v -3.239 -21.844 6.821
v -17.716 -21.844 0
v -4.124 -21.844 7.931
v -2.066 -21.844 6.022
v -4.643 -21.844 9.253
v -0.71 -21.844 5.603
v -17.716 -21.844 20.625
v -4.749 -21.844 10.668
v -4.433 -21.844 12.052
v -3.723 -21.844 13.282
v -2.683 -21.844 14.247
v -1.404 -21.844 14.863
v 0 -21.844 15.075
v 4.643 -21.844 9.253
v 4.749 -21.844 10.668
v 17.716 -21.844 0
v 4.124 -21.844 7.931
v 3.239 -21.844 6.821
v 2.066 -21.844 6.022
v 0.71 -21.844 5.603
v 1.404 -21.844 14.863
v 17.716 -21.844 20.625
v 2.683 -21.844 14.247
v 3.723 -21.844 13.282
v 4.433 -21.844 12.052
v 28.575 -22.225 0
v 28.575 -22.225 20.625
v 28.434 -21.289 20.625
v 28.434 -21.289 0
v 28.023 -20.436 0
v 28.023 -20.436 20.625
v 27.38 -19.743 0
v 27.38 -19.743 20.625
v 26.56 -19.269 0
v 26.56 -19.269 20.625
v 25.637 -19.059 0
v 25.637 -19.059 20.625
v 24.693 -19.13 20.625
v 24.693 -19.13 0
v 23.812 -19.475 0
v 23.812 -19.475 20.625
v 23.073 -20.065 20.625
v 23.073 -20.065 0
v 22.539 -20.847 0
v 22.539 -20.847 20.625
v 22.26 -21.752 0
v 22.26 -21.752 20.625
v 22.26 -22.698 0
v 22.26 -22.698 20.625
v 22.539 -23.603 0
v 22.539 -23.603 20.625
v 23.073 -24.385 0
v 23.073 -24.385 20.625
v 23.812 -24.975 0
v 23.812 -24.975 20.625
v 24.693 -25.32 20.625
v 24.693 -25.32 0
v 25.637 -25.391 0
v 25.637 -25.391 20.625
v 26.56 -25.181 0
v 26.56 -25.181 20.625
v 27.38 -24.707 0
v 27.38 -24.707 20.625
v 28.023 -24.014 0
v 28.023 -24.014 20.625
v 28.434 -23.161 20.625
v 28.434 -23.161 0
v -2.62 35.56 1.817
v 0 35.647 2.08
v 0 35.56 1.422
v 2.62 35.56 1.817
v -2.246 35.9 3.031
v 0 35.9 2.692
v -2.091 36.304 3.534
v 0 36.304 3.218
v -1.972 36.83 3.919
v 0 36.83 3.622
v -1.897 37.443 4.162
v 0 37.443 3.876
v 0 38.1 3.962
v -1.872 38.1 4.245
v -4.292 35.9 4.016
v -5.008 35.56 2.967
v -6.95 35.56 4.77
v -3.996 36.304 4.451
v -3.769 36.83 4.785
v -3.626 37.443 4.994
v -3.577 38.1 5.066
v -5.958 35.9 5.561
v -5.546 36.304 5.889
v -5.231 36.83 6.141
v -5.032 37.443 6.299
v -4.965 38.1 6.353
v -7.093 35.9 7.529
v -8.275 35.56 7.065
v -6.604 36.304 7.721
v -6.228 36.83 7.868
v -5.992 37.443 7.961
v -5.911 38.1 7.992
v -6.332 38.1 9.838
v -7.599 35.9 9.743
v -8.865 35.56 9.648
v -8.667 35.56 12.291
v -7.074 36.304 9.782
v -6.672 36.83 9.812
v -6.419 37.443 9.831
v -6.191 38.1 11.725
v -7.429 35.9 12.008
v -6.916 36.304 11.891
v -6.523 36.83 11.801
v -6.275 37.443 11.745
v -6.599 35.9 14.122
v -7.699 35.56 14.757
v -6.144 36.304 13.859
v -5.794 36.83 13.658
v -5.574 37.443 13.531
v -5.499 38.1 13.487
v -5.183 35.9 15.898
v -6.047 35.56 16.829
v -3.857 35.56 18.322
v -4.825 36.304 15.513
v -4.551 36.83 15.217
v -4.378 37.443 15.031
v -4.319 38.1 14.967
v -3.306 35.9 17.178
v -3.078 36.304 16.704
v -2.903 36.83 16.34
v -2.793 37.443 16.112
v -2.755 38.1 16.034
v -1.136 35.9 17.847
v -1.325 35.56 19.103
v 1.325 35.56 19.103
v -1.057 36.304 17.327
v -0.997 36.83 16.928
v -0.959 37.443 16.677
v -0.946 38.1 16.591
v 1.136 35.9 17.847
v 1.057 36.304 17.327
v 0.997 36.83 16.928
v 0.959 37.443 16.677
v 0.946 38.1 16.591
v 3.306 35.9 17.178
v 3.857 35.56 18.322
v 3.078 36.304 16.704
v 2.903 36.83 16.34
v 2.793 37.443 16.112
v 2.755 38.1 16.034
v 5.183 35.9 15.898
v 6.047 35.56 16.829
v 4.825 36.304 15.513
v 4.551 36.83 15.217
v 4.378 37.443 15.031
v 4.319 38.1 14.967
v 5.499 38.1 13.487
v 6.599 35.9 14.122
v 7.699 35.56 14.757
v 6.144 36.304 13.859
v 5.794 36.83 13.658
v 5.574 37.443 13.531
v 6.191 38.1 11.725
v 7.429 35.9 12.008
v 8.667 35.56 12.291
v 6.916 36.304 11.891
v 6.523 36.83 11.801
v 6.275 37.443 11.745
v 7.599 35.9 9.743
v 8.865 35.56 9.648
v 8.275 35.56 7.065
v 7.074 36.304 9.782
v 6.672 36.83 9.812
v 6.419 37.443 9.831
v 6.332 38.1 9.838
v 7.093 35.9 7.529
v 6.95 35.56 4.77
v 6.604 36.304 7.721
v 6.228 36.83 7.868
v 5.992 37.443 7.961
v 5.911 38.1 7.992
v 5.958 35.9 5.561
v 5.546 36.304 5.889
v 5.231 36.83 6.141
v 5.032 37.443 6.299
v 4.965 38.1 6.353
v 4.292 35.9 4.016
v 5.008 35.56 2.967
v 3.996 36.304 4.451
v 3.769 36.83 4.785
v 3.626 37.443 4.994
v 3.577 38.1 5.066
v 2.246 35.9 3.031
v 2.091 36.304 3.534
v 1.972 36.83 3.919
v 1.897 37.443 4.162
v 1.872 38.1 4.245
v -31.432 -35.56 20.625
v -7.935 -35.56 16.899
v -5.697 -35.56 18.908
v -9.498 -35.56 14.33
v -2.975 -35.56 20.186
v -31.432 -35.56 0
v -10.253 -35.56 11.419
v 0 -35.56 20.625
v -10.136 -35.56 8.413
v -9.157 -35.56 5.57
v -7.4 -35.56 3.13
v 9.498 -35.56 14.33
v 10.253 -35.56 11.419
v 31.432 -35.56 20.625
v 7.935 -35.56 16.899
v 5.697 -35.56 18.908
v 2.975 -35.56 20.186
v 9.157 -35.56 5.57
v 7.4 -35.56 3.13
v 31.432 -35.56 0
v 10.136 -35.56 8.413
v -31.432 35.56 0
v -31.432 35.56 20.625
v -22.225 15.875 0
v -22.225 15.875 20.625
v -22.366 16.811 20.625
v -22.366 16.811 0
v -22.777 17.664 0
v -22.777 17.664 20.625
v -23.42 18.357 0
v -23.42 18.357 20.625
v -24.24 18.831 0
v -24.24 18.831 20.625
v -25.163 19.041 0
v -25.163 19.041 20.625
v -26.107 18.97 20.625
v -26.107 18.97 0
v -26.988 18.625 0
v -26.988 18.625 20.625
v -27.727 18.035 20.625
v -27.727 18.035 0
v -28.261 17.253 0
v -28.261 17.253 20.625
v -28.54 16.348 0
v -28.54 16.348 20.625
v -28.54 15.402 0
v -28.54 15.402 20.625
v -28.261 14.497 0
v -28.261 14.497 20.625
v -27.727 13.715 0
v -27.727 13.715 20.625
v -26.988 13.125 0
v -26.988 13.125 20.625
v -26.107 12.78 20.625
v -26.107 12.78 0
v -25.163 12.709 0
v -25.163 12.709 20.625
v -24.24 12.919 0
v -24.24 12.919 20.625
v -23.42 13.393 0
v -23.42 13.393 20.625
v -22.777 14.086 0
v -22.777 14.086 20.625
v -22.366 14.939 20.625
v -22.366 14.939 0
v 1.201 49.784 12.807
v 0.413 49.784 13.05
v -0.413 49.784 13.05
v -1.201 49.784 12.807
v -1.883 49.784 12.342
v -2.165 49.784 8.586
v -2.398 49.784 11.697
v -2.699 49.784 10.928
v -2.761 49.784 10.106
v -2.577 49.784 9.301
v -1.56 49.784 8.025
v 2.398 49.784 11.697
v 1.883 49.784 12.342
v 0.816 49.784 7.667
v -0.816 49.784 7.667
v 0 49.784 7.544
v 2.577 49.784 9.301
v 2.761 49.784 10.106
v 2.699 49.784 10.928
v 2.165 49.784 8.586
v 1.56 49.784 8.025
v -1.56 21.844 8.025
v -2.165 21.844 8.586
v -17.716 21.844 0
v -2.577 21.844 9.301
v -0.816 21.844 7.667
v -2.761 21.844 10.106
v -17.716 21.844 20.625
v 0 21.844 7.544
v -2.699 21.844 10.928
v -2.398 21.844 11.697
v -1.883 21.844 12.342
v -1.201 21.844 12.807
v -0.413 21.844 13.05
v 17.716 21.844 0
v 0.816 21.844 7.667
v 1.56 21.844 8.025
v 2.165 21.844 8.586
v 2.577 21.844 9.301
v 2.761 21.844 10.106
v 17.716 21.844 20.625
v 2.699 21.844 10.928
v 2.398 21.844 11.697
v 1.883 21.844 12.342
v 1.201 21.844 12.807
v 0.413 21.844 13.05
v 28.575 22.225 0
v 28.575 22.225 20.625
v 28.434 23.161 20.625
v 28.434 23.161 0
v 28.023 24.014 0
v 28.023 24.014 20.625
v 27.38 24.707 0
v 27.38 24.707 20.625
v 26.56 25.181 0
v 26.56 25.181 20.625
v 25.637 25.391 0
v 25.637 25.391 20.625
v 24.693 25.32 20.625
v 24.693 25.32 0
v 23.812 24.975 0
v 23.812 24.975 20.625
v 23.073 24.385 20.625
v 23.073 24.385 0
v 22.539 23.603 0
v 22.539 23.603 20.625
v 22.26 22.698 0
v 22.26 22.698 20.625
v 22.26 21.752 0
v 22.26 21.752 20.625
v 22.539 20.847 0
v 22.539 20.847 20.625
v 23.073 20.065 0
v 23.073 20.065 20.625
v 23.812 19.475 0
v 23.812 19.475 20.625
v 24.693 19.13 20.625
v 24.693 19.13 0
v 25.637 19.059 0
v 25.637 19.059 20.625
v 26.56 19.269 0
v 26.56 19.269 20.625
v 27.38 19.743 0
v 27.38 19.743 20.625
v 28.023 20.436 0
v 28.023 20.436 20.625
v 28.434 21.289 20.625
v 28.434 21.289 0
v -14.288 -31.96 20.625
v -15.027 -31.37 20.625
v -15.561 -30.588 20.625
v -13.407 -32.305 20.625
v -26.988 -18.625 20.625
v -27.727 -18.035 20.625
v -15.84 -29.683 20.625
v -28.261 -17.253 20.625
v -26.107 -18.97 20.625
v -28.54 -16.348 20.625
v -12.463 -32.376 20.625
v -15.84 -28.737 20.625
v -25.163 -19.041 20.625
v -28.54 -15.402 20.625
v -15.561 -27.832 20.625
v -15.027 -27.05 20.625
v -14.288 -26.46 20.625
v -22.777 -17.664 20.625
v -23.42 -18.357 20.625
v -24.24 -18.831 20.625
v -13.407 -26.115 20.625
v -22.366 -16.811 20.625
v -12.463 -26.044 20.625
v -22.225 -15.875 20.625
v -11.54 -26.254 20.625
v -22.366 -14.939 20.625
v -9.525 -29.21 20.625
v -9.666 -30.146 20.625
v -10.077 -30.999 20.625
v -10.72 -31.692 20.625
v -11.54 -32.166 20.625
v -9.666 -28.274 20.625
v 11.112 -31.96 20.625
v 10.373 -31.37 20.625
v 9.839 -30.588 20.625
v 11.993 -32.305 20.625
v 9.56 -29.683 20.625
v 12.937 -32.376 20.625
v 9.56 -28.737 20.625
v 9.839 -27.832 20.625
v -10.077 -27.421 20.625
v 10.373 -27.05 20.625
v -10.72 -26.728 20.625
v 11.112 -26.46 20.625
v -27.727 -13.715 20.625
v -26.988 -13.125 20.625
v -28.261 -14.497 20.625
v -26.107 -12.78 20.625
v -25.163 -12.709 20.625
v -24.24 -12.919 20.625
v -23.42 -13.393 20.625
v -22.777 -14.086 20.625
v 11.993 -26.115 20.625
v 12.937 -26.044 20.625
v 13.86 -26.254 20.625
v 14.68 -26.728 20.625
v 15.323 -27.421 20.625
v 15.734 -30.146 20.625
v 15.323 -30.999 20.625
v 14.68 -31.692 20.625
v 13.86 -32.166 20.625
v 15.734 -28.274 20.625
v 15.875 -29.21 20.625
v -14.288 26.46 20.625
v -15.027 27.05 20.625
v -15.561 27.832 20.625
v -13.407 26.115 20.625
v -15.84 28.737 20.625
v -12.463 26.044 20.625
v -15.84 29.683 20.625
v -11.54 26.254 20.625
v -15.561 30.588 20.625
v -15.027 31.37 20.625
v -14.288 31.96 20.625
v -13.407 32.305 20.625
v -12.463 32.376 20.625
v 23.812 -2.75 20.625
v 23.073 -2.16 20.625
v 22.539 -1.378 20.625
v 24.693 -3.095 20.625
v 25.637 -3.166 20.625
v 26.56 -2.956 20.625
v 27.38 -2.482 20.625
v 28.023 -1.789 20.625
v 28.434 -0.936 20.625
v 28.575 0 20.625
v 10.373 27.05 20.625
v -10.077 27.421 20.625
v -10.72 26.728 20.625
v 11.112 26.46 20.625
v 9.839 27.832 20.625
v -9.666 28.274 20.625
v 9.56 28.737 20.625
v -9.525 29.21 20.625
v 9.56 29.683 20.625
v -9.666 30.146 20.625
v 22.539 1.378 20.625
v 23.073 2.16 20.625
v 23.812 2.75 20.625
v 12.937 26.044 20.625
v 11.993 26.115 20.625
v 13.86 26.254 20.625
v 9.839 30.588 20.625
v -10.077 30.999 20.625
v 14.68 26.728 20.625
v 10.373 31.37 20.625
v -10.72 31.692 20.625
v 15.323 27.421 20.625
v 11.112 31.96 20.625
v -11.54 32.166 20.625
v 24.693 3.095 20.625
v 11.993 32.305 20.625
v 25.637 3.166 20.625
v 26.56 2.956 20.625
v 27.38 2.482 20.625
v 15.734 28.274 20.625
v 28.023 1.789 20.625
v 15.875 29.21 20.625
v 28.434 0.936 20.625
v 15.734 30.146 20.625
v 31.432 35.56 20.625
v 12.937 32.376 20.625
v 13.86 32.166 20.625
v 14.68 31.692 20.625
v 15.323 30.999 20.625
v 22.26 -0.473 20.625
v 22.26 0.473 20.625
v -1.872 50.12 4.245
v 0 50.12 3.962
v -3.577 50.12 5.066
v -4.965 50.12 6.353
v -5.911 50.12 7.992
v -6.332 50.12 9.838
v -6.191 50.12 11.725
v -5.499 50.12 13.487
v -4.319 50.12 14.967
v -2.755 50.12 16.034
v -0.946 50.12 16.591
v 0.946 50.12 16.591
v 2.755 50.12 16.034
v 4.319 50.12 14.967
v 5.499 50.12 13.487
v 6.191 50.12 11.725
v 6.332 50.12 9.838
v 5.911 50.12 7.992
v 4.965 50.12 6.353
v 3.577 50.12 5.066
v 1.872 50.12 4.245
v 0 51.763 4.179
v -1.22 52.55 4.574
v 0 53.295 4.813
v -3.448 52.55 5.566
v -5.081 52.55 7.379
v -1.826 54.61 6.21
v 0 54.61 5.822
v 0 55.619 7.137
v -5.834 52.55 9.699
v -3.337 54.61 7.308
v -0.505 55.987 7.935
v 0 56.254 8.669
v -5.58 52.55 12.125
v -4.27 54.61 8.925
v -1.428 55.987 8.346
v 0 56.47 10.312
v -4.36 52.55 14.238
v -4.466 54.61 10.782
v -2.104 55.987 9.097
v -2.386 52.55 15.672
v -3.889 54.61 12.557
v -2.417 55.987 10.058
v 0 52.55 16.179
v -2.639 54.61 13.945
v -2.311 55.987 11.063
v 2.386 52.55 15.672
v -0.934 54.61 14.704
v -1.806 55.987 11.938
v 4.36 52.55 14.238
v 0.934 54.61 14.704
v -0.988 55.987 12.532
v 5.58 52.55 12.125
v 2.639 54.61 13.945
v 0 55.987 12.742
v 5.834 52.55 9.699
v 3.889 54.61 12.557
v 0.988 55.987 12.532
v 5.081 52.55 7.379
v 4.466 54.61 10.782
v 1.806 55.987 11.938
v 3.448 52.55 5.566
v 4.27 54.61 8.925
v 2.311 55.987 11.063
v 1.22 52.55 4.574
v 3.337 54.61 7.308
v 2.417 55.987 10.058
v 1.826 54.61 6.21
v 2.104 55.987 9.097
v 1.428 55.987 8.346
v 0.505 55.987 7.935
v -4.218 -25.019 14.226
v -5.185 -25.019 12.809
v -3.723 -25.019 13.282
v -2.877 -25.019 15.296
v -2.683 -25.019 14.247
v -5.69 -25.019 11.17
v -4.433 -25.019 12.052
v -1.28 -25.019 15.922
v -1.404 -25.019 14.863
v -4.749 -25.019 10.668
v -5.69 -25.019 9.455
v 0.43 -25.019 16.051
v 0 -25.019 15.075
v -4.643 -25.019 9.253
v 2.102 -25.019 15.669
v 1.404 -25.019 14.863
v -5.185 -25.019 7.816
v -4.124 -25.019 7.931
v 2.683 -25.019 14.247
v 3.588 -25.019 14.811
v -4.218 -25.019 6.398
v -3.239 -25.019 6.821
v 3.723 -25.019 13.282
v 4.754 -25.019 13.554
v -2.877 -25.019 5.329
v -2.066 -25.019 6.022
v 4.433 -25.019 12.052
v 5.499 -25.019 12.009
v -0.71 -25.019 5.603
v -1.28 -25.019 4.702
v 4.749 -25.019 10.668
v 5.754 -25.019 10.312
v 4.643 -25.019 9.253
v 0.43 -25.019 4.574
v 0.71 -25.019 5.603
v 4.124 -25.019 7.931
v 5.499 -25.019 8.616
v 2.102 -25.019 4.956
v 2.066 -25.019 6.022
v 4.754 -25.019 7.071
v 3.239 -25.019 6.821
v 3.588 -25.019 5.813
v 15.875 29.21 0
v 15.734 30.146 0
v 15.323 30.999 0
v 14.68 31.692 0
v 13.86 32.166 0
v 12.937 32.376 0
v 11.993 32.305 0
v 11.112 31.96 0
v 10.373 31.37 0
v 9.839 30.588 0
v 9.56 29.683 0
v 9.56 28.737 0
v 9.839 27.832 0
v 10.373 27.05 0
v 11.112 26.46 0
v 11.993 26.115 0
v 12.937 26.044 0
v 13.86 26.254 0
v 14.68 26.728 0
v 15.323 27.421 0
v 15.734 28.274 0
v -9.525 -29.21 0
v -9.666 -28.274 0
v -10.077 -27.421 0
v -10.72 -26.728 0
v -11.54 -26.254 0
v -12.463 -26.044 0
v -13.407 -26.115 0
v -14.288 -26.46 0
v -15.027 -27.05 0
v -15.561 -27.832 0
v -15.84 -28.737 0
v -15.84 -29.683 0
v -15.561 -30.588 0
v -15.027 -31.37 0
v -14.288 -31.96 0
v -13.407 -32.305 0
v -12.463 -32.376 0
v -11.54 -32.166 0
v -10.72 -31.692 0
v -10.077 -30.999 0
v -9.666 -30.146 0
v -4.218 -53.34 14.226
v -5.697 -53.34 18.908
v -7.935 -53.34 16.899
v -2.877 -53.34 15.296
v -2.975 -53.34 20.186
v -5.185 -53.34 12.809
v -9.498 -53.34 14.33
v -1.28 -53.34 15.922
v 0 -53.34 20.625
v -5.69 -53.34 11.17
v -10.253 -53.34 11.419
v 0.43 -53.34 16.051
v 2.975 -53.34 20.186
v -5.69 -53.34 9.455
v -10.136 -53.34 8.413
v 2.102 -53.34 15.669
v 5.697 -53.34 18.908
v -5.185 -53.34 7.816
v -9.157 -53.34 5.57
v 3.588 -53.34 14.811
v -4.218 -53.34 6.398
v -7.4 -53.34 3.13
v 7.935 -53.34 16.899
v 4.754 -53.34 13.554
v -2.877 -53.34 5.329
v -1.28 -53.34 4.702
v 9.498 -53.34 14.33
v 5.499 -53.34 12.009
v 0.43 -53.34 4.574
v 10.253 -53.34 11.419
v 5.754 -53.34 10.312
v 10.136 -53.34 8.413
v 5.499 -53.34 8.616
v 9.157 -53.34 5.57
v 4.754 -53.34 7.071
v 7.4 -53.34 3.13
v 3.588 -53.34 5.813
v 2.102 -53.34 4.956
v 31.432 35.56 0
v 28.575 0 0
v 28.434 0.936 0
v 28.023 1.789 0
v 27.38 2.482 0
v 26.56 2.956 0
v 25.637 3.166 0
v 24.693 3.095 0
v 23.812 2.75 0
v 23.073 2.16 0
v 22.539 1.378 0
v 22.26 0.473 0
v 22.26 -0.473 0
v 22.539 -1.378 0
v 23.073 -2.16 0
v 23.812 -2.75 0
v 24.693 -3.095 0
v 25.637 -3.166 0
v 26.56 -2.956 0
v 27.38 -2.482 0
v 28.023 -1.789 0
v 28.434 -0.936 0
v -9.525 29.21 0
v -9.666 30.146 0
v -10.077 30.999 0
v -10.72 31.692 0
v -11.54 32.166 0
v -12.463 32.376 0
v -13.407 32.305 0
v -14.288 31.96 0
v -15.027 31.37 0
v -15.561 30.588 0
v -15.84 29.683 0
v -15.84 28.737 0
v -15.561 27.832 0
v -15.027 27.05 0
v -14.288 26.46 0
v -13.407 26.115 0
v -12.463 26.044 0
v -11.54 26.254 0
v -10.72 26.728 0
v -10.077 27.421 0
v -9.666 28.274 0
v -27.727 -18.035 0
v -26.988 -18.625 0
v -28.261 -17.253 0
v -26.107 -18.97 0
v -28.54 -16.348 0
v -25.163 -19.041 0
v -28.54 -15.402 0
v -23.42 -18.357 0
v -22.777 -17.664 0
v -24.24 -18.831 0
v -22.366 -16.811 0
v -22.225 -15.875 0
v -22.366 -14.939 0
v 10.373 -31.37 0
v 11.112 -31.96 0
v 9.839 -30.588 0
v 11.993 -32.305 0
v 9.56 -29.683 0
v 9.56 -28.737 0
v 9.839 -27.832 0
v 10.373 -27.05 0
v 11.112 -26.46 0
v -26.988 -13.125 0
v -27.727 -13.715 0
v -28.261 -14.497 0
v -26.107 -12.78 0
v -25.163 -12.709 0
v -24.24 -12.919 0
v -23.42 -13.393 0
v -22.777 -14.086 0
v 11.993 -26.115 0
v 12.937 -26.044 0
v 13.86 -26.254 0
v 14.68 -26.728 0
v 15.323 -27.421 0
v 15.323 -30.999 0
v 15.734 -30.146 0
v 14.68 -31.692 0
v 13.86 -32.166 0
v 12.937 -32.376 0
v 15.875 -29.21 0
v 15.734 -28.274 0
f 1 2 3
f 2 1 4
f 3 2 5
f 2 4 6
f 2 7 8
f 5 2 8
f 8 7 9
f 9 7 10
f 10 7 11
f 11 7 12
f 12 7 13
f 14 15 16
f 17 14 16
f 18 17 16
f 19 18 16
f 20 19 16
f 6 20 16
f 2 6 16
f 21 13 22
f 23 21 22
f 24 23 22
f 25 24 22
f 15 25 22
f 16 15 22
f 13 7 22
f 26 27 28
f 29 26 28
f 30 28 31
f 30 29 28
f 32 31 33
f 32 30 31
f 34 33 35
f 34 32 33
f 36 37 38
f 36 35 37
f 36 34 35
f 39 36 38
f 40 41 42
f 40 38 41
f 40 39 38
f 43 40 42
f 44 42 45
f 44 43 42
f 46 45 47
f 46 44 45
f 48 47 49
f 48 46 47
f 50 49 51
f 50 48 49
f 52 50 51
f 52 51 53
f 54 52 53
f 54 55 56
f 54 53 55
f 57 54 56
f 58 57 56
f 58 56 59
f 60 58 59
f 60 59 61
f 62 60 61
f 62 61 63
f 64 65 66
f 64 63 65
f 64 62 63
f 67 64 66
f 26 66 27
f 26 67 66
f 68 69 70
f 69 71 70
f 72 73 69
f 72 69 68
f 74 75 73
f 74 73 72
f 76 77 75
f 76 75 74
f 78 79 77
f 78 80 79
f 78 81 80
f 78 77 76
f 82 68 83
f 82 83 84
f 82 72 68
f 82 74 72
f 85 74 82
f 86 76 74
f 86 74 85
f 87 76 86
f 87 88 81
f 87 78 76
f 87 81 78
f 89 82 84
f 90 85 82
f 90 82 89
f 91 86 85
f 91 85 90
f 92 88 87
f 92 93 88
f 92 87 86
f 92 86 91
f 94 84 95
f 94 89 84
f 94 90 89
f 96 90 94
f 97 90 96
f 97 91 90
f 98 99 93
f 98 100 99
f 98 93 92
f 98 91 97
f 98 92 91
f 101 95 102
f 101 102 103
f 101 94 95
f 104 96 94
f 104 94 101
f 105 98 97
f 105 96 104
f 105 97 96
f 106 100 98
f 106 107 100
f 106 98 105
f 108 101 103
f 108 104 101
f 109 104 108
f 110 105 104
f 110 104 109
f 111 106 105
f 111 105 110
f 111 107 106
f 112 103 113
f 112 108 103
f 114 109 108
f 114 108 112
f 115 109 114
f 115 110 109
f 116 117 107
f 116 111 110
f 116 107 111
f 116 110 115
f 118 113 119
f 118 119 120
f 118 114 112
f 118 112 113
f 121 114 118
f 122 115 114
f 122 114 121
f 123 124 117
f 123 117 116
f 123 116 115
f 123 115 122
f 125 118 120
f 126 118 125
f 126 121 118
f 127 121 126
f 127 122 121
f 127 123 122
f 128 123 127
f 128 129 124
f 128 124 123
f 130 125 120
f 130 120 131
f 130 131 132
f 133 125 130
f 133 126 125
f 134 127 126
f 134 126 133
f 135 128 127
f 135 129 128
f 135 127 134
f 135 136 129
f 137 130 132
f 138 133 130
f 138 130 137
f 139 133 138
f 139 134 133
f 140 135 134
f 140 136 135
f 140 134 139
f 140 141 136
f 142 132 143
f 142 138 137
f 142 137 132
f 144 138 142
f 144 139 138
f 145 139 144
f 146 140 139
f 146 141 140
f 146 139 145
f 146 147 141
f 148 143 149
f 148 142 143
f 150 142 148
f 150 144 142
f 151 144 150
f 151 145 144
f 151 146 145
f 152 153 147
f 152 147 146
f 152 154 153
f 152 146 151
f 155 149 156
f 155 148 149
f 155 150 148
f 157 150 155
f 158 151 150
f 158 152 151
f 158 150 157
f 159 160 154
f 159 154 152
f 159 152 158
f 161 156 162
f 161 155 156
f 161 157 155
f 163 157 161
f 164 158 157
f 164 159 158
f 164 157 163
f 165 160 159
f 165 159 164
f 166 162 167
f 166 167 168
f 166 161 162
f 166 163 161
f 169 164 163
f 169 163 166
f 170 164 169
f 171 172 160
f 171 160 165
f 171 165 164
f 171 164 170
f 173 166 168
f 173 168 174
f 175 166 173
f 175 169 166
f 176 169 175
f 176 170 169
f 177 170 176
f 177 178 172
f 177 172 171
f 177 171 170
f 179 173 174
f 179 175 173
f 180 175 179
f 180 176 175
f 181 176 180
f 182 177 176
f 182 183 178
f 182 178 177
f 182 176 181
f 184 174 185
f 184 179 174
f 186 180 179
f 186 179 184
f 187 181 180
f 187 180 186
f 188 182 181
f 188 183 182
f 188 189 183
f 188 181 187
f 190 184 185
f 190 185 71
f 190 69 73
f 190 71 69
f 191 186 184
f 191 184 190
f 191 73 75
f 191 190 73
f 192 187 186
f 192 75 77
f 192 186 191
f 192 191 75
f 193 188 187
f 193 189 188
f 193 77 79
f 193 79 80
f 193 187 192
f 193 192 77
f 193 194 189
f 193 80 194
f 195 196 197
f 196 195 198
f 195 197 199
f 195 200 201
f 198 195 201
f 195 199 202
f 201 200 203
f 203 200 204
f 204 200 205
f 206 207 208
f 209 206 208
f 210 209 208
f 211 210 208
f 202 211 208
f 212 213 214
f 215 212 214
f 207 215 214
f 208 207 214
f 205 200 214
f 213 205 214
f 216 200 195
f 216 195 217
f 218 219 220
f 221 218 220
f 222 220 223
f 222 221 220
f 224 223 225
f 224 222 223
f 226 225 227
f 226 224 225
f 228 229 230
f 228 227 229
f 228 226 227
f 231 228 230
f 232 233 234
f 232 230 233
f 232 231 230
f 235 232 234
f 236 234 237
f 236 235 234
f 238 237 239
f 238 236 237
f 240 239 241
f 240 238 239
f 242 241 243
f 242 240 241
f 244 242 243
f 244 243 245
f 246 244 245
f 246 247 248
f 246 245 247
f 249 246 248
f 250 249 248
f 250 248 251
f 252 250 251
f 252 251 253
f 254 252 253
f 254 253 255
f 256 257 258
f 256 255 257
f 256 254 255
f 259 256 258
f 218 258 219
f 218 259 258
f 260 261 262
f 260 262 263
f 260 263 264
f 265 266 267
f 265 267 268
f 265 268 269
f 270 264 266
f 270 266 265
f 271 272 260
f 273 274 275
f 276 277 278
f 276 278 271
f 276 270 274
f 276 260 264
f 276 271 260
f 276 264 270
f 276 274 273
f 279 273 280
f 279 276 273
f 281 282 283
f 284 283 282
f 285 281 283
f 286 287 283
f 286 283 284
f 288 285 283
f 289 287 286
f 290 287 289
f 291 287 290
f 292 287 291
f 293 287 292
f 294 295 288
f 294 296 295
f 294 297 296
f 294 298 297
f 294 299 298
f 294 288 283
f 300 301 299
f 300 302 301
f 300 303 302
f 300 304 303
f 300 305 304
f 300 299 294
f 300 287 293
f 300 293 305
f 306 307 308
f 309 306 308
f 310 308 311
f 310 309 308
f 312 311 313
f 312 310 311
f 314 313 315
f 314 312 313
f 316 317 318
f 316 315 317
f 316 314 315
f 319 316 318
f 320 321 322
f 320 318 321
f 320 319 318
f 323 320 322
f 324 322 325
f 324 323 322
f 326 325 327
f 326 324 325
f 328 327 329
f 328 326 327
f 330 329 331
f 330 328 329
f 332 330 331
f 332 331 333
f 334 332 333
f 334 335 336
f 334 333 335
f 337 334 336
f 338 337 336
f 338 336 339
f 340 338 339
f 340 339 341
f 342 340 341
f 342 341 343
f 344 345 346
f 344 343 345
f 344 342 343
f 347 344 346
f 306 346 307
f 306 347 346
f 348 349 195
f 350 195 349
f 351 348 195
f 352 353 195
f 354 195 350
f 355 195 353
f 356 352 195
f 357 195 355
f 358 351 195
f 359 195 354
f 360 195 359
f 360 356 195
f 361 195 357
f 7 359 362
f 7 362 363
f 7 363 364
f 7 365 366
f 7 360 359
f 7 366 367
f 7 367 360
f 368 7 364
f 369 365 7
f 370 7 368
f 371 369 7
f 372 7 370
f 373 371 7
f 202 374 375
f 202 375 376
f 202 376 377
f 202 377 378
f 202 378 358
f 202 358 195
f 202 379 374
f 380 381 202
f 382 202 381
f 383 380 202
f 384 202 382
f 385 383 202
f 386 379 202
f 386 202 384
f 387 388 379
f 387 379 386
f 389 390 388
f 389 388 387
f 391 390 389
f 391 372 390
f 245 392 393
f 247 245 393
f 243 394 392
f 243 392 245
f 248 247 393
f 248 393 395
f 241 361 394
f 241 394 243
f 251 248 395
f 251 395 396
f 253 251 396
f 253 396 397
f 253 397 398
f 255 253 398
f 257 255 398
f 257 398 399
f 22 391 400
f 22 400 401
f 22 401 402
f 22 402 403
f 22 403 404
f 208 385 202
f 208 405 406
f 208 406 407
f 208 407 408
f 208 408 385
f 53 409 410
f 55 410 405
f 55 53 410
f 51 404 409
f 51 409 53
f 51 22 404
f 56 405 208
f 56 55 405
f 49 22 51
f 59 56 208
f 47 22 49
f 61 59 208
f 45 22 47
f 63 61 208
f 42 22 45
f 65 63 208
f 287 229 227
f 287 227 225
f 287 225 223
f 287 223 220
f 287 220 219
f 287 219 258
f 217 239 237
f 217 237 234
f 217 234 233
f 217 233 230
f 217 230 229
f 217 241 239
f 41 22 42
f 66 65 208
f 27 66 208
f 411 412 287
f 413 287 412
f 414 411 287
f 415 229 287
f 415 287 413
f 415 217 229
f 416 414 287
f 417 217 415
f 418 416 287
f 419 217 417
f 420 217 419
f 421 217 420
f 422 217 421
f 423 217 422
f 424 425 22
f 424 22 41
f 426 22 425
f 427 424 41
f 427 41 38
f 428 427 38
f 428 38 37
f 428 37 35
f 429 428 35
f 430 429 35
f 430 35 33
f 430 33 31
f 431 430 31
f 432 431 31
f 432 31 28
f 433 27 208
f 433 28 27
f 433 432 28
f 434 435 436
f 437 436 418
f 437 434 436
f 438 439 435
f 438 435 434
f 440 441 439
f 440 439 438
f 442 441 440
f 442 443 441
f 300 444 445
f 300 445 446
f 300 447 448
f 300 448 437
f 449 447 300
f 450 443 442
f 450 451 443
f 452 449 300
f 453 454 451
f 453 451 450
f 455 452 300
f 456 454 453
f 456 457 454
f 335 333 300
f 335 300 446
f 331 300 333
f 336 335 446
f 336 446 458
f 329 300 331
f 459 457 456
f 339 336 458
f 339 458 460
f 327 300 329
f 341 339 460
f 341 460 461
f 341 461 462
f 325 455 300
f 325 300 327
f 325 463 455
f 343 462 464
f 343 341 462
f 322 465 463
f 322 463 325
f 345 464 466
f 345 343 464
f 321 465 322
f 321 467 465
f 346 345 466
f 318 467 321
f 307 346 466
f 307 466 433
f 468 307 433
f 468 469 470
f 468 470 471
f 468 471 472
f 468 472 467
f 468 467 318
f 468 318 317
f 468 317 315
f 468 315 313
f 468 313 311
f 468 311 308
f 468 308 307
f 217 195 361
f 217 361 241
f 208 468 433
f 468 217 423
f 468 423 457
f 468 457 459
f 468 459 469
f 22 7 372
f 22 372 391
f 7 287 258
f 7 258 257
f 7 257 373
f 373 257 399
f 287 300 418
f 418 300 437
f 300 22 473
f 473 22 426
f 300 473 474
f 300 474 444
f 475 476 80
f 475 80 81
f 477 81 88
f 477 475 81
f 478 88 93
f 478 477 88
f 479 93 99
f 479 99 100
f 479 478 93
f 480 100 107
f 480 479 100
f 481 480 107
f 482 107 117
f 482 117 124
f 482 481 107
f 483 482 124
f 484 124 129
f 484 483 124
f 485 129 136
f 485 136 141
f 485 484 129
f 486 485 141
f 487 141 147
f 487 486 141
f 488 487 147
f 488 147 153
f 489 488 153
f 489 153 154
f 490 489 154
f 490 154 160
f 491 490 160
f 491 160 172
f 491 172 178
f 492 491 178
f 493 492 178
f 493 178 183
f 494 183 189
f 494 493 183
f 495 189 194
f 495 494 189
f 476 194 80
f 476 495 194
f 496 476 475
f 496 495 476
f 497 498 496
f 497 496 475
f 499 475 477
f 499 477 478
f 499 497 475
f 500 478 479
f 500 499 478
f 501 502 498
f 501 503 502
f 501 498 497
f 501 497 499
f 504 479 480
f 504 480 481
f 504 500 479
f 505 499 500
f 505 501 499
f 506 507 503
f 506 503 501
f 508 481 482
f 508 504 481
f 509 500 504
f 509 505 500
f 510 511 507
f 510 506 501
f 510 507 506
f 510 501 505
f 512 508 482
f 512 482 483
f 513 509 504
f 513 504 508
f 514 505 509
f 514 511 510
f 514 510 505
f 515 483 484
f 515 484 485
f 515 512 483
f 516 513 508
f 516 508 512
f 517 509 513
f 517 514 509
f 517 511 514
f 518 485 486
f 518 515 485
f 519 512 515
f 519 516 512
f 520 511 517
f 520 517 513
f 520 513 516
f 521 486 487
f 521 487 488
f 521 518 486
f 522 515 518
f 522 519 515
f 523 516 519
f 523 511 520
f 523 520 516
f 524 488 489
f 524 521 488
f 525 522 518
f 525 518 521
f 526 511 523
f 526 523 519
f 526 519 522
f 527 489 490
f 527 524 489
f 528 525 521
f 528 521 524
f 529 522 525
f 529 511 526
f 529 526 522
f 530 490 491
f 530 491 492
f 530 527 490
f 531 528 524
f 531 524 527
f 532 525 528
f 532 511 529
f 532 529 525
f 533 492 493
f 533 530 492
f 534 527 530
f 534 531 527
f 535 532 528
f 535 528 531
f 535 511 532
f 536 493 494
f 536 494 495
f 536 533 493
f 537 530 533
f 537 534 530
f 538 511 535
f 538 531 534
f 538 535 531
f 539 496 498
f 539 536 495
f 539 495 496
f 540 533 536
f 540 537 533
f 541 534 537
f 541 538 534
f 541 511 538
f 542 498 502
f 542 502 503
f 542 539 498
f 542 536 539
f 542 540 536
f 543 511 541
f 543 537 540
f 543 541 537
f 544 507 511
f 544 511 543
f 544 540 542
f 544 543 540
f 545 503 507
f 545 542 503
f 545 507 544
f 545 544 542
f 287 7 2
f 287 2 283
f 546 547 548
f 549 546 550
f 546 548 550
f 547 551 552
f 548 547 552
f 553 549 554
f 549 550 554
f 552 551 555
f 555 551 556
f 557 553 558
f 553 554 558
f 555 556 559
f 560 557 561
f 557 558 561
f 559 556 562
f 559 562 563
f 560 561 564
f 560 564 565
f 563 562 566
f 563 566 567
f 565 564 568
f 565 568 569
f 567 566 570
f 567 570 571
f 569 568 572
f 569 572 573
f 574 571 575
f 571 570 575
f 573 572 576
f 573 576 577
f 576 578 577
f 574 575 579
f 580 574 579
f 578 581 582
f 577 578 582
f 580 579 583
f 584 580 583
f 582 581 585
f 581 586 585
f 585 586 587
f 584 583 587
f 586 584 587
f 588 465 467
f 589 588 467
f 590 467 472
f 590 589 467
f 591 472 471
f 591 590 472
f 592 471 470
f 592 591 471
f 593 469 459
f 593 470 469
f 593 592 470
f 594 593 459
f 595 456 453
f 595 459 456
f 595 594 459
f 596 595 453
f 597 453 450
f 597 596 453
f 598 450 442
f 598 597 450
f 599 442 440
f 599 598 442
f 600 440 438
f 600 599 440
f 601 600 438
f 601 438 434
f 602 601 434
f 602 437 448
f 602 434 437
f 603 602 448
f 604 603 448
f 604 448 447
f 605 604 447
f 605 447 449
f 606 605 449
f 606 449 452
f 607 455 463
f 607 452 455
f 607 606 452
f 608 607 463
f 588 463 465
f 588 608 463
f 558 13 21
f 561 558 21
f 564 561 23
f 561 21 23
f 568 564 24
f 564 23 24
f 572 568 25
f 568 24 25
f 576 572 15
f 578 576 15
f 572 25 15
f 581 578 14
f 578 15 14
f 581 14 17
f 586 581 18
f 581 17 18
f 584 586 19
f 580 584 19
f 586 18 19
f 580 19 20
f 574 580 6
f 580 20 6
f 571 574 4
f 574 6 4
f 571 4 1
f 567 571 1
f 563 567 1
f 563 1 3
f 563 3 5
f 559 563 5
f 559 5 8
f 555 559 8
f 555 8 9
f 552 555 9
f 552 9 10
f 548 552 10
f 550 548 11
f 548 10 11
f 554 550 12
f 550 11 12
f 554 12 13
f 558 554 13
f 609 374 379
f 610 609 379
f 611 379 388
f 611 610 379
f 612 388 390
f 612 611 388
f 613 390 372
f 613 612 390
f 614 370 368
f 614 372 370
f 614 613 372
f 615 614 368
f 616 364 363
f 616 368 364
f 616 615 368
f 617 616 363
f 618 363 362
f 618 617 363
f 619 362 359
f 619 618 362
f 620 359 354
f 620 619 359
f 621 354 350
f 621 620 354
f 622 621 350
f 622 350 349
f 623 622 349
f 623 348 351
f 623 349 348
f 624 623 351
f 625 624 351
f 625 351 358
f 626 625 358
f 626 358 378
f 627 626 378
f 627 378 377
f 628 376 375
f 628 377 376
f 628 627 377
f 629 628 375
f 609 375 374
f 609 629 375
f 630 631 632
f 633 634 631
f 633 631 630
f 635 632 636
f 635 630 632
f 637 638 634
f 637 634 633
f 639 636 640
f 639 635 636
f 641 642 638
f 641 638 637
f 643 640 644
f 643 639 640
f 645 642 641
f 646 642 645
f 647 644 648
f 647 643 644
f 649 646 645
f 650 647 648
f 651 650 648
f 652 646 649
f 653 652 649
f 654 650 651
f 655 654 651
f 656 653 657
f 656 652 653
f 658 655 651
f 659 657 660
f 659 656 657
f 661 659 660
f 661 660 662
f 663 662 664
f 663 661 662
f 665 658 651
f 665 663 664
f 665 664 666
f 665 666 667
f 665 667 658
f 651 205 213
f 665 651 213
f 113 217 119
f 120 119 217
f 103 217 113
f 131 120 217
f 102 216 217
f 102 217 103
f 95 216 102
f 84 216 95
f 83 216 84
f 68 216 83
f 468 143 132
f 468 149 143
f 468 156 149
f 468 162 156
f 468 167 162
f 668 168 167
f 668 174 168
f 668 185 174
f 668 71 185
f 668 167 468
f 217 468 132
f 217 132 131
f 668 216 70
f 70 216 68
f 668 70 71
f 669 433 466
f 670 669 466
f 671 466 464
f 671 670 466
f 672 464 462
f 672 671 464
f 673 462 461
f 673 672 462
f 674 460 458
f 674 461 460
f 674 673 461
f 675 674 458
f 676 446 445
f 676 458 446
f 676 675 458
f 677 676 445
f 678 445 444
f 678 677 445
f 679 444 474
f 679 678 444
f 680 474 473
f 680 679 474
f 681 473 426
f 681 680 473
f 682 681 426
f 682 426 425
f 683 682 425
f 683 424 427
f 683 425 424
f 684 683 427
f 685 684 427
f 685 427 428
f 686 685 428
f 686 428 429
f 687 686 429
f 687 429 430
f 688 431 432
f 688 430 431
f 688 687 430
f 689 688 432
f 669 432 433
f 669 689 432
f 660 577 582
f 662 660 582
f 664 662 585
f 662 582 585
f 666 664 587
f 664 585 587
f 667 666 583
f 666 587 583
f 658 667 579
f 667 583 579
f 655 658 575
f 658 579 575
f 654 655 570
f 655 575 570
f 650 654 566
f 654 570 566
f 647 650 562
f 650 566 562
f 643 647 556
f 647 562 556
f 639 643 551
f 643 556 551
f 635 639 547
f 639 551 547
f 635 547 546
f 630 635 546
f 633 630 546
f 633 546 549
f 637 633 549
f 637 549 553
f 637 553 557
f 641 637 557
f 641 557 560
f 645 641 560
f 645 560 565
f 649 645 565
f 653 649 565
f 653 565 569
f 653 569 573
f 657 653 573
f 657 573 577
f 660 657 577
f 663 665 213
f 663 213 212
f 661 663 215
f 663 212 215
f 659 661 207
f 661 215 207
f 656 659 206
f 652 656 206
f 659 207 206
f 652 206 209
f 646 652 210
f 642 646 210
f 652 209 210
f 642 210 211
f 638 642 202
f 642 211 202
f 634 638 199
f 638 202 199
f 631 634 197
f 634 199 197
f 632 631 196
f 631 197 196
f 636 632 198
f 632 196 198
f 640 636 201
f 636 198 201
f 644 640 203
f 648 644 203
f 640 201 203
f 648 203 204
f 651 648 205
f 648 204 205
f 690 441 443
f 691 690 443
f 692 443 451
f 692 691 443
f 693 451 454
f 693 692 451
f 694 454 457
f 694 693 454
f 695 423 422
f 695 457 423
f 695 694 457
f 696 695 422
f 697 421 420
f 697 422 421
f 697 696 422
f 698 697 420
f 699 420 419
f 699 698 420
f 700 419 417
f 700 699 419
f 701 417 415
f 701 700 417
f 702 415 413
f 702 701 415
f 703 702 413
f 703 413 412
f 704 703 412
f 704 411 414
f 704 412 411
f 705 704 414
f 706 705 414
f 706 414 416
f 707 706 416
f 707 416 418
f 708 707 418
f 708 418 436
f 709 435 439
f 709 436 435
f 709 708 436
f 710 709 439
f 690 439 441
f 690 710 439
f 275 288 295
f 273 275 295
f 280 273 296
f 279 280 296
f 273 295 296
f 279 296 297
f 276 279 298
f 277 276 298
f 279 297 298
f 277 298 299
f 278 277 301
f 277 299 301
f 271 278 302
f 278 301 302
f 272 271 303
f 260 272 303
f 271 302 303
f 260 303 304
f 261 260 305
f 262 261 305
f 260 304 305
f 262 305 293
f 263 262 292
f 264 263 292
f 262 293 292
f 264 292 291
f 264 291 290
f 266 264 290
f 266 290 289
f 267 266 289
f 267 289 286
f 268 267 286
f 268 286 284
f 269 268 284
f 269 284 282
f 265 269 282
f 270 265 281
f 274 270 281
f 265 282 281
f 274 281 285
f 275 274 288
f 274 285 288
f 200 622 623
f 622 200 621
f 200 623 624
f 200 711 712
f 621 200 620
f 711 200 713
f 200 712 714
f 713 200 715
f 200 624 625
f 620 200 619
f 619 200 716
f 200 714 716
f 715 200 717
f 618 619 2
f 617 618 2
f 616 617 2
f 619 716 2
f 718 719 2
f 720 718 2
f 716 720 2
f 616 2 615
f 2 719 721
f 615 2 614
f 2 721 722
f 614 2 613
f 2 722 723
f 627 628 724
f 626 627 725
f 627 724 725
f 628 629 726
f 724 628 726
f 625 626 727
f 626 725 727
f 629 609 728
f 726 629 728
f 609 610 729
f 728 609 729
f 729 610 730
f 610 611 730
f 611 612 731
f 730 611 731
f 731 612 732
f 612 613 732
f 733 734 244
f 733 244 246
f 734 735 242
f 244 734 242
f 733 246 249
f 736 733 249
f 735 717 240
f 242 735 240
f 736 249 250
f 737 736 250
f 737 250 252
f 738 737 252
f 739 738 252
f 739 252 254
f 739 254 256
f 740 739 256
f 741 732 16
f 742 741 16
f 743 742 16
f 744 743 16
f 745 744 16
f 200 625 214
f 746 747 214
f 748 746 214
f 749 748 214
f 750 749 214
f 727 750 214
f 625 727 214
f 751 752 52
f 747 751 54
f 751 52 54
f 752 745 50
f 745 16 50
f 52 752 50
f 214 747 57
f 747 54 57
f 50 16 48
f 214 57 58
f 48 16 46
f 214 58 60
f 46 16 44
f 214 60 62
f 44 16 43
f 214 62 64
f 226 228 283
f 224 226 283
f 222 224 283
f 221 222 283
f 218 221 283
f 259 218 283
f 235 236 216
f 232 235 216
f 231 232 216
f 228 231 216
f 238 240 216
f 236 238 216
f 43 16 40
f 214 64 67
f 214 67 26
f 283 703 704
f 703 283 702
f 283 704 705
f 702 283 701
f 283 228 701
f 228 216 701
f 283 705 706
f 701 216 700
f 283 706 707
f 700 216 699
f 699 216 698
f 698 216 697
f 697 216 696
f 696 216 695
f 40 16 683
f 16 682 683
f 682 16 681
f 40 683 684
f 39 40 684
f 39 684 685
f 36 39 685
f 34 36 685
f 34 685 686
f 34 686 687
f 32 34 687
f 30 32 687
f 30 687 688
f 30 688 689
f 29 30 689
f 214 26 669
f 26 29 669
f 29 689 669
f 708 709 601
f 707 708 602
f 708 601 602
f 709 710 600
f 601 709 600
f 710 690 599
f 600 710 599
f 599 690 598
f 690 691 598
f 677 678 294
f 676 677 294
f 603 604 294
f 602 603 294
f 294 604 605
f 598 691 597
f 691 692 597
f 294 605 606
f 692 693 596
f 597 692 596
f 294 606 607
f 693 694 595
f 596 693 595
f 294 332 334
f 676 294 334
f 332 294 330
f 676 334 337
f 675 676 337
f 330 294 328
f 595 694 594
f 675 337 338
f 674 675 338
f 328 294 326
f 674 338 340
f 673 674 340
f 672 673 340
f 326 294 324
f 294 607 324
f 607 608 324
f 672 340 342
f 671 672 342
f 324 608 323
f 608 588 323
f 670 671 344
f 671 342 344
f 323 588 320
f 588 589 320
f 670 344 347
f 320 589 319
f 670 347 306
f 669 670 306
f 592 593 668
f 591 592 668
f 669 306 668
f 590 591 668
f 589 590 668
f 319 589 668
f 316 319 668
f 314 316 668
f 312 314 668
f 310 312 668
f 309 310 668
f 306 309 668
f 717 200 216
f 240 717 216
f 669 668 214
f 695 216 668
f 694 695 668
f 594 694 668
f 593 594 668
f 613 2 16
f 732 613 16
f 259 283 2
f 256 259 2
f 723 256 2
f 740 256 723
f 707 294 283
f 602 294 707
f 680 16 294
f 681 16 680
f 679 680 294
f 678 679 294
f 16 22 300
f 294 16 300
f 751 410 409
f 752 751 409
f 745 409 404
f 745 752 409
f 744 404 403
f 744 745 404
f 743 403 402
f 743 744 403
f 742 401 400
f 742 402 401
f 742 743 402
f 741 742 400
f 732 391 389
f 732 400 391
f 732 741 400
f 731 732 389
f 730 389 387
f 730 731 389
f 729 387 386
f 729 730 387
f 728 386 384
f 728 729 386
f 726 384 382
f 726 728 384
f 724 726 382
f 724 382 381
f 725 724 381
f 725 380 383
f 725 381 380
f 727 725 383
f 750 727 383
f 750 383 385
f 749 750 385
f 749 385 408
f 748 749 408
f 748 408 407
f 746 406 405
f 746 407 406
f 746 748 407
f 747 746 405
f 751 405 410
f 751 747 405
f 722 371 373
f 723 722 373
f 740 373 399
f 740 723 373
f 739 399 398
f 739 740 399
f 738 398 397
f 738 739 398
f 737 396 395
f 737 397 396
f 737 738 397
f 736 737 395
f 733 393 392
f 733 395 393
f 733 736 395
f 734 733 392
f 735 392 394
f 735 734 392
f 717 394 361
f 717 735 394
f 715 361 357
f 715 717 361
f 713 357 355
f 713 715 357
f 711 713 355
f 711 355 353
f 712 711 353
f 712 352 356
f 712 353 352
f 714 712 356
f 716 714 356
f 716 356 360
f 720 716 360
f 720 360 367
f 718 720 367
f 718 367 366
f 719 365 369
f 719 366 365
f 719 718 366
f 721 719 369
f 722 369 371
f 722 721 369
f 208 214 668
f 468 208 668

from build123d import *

# Parameters (mm, degrees)
SKETCH1_W                   = 62.865
SKETCH1_H                   = 71.12
BOSS_EXTRUDE1_DEPTH         = 20.6248
CUT_EXTRUDE2_DEPTH          = 52.748410906
CUT_EXTRUDE2_DEPTH_BACK     = 52.748410906
SKETCH4_R                   = 3.175
FILLET1_R                   = 2.54
SKETCH2_W                   = 35.433
SKETCH2_H                   = 43.688
CUT_EXTRUDE3_DEPTH          = 68.839744016
SKETCH6_R                   = 2.7686
CUT_EXTRUDE4_DEPTH          = 27.94
SKETCH7_R                   = 10.3124
BOSS_EXTRUDE2_DEPTH         = 17.78
CUT_EXTRUDE5_START          = -17.78
CUT_EXTRUDE5_DEPTH          = 17.78
SKETCH9_R                   = 4.7625
CUT_EXTRUDE6_DEPTH          = 3.175
F_1_2_20_TAPPED_HOLE1_D     = 11.50874
F_1_2_20_TAPPED_HOLE1_DEPTH = 28.321


with BuildPart() as part:
    # Sketch1 → Boss-Extrude1 (new body)
    with BuildSketch(Plane.XY):
        Rectangle(SKETCH1_W, SKETCH1_H)
    extrude(amount=BOSS_EXTRUDE1_DEPTH)

    # Sketch4 → Cut-Extrude2 (cut, two sides: drawn at the far end of the back side and taken through both)
    with BuildSketch(Plane.XY.offset(20.6248).offset(-CUT_EXTRUDE2_DEPTH_BACK)):
        with Locations((-12.7, 29.21)):
            Circle(SKETCH4_R)
        with Locations((-25.4, 15.875)):
            Circle(SKETCH4_R)
        with Locations((-12.7, -29.21)):
            Circle(SKETCH4_R)
        with Locations((-25.4, -15.875)):
            Circle(SKETCH4_R)
        with Locations((12.7, -29.21)):
            Circle(SKETCH4_R)
        with Locations((12.7, 29.21)):
            Circle(SKETCH4_R)
        with Locations((25.4, 0)):
            Circle(SKETCH4_R)
        with Locations((25.4, 22.225)):
            Circle(SKETCH4_R)
        with Locations((25.4, -22.225)):
            Circle(SKETCH4_R)
    extrude(amount=CUT_EXTRUDE2_DEPTH + CUT_EXTRUDE2_DEPTH_BACK, mode=Mode.SUBTRACT)

    # Sketch5 → Revolve2 (revolve)
    with BuildSketch(Plane(origin=(0, 0, 0), x_dir=(0, 0, -1), z_dir=(1, 0, 0)), mode=Mode.PRIVATE) as revolve2_sk:
        with BuildLine():
            Line((-16.6624, 35.56), (-16.6624, 50.119871939))
            ThreePointArc((-16.6624, 50.119871939), (-14.802528061, 54.61), (-10.3124, 56.469871939))
            Line((-10.3124, 56.469871939), (-10.3124, 35.56))
            Line((-10.3124, 35.56), (-16.6624, 35.56))
        make_face()
    revolve(revolve2_sk.sketch.rotate(Axis((0, 35.56, 10.3124), (0, 1, 0)), 180), axis=Axis((0, 35.56, 10.3124), (0, 1, 0)))

    # Fillet1
    fillet1_edges = [part.edges().sort_by_distance(p)[0] for p in [
        (0, 35.56, 16.6624),
    ]]
    fillet(fillet1_edges, radius=FILLET1_R)

    # Sketch2 → Cut-Extrude3 (cut, through all)
    with BuildSketch(Plane.XY.offset(20.6248)):
        Rectangle(SKETCH2_W, SKETCH2_H)
    extrude(amount=-CUT_EXTRUDE3_DEPTH, mode=Mode.SUBTRACT)

    # Sketch6 → Cut-Extrude4 (cut)
    with BuildSketch(Plane.XZ.offset(-21.844)):
        with Locations(Location((0, 10.3124, 0), (0, 0, 270))):
            Circle(SKETCH6_R)
    extrude(amount=-CUT_EXTRUDE4_DEPTH, mode=Mode.SUBTRACT)

    # Sketch7 → Boss-Extrude2 (add)
    with BuildSketch(Plane.XZ.offset(35.56)):
        with Locations(Location((0, 10.3124, 0), (0, 0, 270))):
            Circle(SKETCH7_R)
    extrude(amount=BOSS_EXTRUDE2_DEPTH)

    # Sketch8 → Cut-Extrude5 (cut)
    with BuildSketch(Plane.XZ.offset(53.34).offset(CUT_EXTRUDE5_START)):
        with BuildLine():
            Line((-7.399596954, 3.12967359), (-5.795378061, 3.12967359))
            Line((-5.795378061, 3.12967359), (7.399596954, 3.12967359))
            ThreePointArc((7.399596954, 3.12967359), (0, 0), (-7.399596954, 3.12967359))
        make_face()
    extrude(amount=CUT_EXTRUDE5_DEPTH, mode=Mode.SUBTRACT)

    # Sketch9 → Cut-Extrude6 (cut)
    with BuildSketch(Plane(origin=(0, -21.844, 0), x_dir=(1, 0, 0), z_dir=(0, 1, 0))):
        with Locations(Location((0, -10.3124, 0), (0, 0, 270))):
            Circle(SKETCH9_R)
    extrude(amount=-CUT_EXTRUDE6_DEPTH, mode=Mode.SUBTRACT)

    # 1/2-20 Tapped Hole1
    with Locations(Plane(origin=(0, -53.34, 0), x_dir=(-1, 0, 0), z_dir=(0, -1, 0))):
        with Locations((0, -10.3124)):
            Hole(F_1_2_20_TAPPED_HOLE1_D / 2, depth=F_1_2_20_TAPPED_HOLE1_DEPTH)


solid = part.part
